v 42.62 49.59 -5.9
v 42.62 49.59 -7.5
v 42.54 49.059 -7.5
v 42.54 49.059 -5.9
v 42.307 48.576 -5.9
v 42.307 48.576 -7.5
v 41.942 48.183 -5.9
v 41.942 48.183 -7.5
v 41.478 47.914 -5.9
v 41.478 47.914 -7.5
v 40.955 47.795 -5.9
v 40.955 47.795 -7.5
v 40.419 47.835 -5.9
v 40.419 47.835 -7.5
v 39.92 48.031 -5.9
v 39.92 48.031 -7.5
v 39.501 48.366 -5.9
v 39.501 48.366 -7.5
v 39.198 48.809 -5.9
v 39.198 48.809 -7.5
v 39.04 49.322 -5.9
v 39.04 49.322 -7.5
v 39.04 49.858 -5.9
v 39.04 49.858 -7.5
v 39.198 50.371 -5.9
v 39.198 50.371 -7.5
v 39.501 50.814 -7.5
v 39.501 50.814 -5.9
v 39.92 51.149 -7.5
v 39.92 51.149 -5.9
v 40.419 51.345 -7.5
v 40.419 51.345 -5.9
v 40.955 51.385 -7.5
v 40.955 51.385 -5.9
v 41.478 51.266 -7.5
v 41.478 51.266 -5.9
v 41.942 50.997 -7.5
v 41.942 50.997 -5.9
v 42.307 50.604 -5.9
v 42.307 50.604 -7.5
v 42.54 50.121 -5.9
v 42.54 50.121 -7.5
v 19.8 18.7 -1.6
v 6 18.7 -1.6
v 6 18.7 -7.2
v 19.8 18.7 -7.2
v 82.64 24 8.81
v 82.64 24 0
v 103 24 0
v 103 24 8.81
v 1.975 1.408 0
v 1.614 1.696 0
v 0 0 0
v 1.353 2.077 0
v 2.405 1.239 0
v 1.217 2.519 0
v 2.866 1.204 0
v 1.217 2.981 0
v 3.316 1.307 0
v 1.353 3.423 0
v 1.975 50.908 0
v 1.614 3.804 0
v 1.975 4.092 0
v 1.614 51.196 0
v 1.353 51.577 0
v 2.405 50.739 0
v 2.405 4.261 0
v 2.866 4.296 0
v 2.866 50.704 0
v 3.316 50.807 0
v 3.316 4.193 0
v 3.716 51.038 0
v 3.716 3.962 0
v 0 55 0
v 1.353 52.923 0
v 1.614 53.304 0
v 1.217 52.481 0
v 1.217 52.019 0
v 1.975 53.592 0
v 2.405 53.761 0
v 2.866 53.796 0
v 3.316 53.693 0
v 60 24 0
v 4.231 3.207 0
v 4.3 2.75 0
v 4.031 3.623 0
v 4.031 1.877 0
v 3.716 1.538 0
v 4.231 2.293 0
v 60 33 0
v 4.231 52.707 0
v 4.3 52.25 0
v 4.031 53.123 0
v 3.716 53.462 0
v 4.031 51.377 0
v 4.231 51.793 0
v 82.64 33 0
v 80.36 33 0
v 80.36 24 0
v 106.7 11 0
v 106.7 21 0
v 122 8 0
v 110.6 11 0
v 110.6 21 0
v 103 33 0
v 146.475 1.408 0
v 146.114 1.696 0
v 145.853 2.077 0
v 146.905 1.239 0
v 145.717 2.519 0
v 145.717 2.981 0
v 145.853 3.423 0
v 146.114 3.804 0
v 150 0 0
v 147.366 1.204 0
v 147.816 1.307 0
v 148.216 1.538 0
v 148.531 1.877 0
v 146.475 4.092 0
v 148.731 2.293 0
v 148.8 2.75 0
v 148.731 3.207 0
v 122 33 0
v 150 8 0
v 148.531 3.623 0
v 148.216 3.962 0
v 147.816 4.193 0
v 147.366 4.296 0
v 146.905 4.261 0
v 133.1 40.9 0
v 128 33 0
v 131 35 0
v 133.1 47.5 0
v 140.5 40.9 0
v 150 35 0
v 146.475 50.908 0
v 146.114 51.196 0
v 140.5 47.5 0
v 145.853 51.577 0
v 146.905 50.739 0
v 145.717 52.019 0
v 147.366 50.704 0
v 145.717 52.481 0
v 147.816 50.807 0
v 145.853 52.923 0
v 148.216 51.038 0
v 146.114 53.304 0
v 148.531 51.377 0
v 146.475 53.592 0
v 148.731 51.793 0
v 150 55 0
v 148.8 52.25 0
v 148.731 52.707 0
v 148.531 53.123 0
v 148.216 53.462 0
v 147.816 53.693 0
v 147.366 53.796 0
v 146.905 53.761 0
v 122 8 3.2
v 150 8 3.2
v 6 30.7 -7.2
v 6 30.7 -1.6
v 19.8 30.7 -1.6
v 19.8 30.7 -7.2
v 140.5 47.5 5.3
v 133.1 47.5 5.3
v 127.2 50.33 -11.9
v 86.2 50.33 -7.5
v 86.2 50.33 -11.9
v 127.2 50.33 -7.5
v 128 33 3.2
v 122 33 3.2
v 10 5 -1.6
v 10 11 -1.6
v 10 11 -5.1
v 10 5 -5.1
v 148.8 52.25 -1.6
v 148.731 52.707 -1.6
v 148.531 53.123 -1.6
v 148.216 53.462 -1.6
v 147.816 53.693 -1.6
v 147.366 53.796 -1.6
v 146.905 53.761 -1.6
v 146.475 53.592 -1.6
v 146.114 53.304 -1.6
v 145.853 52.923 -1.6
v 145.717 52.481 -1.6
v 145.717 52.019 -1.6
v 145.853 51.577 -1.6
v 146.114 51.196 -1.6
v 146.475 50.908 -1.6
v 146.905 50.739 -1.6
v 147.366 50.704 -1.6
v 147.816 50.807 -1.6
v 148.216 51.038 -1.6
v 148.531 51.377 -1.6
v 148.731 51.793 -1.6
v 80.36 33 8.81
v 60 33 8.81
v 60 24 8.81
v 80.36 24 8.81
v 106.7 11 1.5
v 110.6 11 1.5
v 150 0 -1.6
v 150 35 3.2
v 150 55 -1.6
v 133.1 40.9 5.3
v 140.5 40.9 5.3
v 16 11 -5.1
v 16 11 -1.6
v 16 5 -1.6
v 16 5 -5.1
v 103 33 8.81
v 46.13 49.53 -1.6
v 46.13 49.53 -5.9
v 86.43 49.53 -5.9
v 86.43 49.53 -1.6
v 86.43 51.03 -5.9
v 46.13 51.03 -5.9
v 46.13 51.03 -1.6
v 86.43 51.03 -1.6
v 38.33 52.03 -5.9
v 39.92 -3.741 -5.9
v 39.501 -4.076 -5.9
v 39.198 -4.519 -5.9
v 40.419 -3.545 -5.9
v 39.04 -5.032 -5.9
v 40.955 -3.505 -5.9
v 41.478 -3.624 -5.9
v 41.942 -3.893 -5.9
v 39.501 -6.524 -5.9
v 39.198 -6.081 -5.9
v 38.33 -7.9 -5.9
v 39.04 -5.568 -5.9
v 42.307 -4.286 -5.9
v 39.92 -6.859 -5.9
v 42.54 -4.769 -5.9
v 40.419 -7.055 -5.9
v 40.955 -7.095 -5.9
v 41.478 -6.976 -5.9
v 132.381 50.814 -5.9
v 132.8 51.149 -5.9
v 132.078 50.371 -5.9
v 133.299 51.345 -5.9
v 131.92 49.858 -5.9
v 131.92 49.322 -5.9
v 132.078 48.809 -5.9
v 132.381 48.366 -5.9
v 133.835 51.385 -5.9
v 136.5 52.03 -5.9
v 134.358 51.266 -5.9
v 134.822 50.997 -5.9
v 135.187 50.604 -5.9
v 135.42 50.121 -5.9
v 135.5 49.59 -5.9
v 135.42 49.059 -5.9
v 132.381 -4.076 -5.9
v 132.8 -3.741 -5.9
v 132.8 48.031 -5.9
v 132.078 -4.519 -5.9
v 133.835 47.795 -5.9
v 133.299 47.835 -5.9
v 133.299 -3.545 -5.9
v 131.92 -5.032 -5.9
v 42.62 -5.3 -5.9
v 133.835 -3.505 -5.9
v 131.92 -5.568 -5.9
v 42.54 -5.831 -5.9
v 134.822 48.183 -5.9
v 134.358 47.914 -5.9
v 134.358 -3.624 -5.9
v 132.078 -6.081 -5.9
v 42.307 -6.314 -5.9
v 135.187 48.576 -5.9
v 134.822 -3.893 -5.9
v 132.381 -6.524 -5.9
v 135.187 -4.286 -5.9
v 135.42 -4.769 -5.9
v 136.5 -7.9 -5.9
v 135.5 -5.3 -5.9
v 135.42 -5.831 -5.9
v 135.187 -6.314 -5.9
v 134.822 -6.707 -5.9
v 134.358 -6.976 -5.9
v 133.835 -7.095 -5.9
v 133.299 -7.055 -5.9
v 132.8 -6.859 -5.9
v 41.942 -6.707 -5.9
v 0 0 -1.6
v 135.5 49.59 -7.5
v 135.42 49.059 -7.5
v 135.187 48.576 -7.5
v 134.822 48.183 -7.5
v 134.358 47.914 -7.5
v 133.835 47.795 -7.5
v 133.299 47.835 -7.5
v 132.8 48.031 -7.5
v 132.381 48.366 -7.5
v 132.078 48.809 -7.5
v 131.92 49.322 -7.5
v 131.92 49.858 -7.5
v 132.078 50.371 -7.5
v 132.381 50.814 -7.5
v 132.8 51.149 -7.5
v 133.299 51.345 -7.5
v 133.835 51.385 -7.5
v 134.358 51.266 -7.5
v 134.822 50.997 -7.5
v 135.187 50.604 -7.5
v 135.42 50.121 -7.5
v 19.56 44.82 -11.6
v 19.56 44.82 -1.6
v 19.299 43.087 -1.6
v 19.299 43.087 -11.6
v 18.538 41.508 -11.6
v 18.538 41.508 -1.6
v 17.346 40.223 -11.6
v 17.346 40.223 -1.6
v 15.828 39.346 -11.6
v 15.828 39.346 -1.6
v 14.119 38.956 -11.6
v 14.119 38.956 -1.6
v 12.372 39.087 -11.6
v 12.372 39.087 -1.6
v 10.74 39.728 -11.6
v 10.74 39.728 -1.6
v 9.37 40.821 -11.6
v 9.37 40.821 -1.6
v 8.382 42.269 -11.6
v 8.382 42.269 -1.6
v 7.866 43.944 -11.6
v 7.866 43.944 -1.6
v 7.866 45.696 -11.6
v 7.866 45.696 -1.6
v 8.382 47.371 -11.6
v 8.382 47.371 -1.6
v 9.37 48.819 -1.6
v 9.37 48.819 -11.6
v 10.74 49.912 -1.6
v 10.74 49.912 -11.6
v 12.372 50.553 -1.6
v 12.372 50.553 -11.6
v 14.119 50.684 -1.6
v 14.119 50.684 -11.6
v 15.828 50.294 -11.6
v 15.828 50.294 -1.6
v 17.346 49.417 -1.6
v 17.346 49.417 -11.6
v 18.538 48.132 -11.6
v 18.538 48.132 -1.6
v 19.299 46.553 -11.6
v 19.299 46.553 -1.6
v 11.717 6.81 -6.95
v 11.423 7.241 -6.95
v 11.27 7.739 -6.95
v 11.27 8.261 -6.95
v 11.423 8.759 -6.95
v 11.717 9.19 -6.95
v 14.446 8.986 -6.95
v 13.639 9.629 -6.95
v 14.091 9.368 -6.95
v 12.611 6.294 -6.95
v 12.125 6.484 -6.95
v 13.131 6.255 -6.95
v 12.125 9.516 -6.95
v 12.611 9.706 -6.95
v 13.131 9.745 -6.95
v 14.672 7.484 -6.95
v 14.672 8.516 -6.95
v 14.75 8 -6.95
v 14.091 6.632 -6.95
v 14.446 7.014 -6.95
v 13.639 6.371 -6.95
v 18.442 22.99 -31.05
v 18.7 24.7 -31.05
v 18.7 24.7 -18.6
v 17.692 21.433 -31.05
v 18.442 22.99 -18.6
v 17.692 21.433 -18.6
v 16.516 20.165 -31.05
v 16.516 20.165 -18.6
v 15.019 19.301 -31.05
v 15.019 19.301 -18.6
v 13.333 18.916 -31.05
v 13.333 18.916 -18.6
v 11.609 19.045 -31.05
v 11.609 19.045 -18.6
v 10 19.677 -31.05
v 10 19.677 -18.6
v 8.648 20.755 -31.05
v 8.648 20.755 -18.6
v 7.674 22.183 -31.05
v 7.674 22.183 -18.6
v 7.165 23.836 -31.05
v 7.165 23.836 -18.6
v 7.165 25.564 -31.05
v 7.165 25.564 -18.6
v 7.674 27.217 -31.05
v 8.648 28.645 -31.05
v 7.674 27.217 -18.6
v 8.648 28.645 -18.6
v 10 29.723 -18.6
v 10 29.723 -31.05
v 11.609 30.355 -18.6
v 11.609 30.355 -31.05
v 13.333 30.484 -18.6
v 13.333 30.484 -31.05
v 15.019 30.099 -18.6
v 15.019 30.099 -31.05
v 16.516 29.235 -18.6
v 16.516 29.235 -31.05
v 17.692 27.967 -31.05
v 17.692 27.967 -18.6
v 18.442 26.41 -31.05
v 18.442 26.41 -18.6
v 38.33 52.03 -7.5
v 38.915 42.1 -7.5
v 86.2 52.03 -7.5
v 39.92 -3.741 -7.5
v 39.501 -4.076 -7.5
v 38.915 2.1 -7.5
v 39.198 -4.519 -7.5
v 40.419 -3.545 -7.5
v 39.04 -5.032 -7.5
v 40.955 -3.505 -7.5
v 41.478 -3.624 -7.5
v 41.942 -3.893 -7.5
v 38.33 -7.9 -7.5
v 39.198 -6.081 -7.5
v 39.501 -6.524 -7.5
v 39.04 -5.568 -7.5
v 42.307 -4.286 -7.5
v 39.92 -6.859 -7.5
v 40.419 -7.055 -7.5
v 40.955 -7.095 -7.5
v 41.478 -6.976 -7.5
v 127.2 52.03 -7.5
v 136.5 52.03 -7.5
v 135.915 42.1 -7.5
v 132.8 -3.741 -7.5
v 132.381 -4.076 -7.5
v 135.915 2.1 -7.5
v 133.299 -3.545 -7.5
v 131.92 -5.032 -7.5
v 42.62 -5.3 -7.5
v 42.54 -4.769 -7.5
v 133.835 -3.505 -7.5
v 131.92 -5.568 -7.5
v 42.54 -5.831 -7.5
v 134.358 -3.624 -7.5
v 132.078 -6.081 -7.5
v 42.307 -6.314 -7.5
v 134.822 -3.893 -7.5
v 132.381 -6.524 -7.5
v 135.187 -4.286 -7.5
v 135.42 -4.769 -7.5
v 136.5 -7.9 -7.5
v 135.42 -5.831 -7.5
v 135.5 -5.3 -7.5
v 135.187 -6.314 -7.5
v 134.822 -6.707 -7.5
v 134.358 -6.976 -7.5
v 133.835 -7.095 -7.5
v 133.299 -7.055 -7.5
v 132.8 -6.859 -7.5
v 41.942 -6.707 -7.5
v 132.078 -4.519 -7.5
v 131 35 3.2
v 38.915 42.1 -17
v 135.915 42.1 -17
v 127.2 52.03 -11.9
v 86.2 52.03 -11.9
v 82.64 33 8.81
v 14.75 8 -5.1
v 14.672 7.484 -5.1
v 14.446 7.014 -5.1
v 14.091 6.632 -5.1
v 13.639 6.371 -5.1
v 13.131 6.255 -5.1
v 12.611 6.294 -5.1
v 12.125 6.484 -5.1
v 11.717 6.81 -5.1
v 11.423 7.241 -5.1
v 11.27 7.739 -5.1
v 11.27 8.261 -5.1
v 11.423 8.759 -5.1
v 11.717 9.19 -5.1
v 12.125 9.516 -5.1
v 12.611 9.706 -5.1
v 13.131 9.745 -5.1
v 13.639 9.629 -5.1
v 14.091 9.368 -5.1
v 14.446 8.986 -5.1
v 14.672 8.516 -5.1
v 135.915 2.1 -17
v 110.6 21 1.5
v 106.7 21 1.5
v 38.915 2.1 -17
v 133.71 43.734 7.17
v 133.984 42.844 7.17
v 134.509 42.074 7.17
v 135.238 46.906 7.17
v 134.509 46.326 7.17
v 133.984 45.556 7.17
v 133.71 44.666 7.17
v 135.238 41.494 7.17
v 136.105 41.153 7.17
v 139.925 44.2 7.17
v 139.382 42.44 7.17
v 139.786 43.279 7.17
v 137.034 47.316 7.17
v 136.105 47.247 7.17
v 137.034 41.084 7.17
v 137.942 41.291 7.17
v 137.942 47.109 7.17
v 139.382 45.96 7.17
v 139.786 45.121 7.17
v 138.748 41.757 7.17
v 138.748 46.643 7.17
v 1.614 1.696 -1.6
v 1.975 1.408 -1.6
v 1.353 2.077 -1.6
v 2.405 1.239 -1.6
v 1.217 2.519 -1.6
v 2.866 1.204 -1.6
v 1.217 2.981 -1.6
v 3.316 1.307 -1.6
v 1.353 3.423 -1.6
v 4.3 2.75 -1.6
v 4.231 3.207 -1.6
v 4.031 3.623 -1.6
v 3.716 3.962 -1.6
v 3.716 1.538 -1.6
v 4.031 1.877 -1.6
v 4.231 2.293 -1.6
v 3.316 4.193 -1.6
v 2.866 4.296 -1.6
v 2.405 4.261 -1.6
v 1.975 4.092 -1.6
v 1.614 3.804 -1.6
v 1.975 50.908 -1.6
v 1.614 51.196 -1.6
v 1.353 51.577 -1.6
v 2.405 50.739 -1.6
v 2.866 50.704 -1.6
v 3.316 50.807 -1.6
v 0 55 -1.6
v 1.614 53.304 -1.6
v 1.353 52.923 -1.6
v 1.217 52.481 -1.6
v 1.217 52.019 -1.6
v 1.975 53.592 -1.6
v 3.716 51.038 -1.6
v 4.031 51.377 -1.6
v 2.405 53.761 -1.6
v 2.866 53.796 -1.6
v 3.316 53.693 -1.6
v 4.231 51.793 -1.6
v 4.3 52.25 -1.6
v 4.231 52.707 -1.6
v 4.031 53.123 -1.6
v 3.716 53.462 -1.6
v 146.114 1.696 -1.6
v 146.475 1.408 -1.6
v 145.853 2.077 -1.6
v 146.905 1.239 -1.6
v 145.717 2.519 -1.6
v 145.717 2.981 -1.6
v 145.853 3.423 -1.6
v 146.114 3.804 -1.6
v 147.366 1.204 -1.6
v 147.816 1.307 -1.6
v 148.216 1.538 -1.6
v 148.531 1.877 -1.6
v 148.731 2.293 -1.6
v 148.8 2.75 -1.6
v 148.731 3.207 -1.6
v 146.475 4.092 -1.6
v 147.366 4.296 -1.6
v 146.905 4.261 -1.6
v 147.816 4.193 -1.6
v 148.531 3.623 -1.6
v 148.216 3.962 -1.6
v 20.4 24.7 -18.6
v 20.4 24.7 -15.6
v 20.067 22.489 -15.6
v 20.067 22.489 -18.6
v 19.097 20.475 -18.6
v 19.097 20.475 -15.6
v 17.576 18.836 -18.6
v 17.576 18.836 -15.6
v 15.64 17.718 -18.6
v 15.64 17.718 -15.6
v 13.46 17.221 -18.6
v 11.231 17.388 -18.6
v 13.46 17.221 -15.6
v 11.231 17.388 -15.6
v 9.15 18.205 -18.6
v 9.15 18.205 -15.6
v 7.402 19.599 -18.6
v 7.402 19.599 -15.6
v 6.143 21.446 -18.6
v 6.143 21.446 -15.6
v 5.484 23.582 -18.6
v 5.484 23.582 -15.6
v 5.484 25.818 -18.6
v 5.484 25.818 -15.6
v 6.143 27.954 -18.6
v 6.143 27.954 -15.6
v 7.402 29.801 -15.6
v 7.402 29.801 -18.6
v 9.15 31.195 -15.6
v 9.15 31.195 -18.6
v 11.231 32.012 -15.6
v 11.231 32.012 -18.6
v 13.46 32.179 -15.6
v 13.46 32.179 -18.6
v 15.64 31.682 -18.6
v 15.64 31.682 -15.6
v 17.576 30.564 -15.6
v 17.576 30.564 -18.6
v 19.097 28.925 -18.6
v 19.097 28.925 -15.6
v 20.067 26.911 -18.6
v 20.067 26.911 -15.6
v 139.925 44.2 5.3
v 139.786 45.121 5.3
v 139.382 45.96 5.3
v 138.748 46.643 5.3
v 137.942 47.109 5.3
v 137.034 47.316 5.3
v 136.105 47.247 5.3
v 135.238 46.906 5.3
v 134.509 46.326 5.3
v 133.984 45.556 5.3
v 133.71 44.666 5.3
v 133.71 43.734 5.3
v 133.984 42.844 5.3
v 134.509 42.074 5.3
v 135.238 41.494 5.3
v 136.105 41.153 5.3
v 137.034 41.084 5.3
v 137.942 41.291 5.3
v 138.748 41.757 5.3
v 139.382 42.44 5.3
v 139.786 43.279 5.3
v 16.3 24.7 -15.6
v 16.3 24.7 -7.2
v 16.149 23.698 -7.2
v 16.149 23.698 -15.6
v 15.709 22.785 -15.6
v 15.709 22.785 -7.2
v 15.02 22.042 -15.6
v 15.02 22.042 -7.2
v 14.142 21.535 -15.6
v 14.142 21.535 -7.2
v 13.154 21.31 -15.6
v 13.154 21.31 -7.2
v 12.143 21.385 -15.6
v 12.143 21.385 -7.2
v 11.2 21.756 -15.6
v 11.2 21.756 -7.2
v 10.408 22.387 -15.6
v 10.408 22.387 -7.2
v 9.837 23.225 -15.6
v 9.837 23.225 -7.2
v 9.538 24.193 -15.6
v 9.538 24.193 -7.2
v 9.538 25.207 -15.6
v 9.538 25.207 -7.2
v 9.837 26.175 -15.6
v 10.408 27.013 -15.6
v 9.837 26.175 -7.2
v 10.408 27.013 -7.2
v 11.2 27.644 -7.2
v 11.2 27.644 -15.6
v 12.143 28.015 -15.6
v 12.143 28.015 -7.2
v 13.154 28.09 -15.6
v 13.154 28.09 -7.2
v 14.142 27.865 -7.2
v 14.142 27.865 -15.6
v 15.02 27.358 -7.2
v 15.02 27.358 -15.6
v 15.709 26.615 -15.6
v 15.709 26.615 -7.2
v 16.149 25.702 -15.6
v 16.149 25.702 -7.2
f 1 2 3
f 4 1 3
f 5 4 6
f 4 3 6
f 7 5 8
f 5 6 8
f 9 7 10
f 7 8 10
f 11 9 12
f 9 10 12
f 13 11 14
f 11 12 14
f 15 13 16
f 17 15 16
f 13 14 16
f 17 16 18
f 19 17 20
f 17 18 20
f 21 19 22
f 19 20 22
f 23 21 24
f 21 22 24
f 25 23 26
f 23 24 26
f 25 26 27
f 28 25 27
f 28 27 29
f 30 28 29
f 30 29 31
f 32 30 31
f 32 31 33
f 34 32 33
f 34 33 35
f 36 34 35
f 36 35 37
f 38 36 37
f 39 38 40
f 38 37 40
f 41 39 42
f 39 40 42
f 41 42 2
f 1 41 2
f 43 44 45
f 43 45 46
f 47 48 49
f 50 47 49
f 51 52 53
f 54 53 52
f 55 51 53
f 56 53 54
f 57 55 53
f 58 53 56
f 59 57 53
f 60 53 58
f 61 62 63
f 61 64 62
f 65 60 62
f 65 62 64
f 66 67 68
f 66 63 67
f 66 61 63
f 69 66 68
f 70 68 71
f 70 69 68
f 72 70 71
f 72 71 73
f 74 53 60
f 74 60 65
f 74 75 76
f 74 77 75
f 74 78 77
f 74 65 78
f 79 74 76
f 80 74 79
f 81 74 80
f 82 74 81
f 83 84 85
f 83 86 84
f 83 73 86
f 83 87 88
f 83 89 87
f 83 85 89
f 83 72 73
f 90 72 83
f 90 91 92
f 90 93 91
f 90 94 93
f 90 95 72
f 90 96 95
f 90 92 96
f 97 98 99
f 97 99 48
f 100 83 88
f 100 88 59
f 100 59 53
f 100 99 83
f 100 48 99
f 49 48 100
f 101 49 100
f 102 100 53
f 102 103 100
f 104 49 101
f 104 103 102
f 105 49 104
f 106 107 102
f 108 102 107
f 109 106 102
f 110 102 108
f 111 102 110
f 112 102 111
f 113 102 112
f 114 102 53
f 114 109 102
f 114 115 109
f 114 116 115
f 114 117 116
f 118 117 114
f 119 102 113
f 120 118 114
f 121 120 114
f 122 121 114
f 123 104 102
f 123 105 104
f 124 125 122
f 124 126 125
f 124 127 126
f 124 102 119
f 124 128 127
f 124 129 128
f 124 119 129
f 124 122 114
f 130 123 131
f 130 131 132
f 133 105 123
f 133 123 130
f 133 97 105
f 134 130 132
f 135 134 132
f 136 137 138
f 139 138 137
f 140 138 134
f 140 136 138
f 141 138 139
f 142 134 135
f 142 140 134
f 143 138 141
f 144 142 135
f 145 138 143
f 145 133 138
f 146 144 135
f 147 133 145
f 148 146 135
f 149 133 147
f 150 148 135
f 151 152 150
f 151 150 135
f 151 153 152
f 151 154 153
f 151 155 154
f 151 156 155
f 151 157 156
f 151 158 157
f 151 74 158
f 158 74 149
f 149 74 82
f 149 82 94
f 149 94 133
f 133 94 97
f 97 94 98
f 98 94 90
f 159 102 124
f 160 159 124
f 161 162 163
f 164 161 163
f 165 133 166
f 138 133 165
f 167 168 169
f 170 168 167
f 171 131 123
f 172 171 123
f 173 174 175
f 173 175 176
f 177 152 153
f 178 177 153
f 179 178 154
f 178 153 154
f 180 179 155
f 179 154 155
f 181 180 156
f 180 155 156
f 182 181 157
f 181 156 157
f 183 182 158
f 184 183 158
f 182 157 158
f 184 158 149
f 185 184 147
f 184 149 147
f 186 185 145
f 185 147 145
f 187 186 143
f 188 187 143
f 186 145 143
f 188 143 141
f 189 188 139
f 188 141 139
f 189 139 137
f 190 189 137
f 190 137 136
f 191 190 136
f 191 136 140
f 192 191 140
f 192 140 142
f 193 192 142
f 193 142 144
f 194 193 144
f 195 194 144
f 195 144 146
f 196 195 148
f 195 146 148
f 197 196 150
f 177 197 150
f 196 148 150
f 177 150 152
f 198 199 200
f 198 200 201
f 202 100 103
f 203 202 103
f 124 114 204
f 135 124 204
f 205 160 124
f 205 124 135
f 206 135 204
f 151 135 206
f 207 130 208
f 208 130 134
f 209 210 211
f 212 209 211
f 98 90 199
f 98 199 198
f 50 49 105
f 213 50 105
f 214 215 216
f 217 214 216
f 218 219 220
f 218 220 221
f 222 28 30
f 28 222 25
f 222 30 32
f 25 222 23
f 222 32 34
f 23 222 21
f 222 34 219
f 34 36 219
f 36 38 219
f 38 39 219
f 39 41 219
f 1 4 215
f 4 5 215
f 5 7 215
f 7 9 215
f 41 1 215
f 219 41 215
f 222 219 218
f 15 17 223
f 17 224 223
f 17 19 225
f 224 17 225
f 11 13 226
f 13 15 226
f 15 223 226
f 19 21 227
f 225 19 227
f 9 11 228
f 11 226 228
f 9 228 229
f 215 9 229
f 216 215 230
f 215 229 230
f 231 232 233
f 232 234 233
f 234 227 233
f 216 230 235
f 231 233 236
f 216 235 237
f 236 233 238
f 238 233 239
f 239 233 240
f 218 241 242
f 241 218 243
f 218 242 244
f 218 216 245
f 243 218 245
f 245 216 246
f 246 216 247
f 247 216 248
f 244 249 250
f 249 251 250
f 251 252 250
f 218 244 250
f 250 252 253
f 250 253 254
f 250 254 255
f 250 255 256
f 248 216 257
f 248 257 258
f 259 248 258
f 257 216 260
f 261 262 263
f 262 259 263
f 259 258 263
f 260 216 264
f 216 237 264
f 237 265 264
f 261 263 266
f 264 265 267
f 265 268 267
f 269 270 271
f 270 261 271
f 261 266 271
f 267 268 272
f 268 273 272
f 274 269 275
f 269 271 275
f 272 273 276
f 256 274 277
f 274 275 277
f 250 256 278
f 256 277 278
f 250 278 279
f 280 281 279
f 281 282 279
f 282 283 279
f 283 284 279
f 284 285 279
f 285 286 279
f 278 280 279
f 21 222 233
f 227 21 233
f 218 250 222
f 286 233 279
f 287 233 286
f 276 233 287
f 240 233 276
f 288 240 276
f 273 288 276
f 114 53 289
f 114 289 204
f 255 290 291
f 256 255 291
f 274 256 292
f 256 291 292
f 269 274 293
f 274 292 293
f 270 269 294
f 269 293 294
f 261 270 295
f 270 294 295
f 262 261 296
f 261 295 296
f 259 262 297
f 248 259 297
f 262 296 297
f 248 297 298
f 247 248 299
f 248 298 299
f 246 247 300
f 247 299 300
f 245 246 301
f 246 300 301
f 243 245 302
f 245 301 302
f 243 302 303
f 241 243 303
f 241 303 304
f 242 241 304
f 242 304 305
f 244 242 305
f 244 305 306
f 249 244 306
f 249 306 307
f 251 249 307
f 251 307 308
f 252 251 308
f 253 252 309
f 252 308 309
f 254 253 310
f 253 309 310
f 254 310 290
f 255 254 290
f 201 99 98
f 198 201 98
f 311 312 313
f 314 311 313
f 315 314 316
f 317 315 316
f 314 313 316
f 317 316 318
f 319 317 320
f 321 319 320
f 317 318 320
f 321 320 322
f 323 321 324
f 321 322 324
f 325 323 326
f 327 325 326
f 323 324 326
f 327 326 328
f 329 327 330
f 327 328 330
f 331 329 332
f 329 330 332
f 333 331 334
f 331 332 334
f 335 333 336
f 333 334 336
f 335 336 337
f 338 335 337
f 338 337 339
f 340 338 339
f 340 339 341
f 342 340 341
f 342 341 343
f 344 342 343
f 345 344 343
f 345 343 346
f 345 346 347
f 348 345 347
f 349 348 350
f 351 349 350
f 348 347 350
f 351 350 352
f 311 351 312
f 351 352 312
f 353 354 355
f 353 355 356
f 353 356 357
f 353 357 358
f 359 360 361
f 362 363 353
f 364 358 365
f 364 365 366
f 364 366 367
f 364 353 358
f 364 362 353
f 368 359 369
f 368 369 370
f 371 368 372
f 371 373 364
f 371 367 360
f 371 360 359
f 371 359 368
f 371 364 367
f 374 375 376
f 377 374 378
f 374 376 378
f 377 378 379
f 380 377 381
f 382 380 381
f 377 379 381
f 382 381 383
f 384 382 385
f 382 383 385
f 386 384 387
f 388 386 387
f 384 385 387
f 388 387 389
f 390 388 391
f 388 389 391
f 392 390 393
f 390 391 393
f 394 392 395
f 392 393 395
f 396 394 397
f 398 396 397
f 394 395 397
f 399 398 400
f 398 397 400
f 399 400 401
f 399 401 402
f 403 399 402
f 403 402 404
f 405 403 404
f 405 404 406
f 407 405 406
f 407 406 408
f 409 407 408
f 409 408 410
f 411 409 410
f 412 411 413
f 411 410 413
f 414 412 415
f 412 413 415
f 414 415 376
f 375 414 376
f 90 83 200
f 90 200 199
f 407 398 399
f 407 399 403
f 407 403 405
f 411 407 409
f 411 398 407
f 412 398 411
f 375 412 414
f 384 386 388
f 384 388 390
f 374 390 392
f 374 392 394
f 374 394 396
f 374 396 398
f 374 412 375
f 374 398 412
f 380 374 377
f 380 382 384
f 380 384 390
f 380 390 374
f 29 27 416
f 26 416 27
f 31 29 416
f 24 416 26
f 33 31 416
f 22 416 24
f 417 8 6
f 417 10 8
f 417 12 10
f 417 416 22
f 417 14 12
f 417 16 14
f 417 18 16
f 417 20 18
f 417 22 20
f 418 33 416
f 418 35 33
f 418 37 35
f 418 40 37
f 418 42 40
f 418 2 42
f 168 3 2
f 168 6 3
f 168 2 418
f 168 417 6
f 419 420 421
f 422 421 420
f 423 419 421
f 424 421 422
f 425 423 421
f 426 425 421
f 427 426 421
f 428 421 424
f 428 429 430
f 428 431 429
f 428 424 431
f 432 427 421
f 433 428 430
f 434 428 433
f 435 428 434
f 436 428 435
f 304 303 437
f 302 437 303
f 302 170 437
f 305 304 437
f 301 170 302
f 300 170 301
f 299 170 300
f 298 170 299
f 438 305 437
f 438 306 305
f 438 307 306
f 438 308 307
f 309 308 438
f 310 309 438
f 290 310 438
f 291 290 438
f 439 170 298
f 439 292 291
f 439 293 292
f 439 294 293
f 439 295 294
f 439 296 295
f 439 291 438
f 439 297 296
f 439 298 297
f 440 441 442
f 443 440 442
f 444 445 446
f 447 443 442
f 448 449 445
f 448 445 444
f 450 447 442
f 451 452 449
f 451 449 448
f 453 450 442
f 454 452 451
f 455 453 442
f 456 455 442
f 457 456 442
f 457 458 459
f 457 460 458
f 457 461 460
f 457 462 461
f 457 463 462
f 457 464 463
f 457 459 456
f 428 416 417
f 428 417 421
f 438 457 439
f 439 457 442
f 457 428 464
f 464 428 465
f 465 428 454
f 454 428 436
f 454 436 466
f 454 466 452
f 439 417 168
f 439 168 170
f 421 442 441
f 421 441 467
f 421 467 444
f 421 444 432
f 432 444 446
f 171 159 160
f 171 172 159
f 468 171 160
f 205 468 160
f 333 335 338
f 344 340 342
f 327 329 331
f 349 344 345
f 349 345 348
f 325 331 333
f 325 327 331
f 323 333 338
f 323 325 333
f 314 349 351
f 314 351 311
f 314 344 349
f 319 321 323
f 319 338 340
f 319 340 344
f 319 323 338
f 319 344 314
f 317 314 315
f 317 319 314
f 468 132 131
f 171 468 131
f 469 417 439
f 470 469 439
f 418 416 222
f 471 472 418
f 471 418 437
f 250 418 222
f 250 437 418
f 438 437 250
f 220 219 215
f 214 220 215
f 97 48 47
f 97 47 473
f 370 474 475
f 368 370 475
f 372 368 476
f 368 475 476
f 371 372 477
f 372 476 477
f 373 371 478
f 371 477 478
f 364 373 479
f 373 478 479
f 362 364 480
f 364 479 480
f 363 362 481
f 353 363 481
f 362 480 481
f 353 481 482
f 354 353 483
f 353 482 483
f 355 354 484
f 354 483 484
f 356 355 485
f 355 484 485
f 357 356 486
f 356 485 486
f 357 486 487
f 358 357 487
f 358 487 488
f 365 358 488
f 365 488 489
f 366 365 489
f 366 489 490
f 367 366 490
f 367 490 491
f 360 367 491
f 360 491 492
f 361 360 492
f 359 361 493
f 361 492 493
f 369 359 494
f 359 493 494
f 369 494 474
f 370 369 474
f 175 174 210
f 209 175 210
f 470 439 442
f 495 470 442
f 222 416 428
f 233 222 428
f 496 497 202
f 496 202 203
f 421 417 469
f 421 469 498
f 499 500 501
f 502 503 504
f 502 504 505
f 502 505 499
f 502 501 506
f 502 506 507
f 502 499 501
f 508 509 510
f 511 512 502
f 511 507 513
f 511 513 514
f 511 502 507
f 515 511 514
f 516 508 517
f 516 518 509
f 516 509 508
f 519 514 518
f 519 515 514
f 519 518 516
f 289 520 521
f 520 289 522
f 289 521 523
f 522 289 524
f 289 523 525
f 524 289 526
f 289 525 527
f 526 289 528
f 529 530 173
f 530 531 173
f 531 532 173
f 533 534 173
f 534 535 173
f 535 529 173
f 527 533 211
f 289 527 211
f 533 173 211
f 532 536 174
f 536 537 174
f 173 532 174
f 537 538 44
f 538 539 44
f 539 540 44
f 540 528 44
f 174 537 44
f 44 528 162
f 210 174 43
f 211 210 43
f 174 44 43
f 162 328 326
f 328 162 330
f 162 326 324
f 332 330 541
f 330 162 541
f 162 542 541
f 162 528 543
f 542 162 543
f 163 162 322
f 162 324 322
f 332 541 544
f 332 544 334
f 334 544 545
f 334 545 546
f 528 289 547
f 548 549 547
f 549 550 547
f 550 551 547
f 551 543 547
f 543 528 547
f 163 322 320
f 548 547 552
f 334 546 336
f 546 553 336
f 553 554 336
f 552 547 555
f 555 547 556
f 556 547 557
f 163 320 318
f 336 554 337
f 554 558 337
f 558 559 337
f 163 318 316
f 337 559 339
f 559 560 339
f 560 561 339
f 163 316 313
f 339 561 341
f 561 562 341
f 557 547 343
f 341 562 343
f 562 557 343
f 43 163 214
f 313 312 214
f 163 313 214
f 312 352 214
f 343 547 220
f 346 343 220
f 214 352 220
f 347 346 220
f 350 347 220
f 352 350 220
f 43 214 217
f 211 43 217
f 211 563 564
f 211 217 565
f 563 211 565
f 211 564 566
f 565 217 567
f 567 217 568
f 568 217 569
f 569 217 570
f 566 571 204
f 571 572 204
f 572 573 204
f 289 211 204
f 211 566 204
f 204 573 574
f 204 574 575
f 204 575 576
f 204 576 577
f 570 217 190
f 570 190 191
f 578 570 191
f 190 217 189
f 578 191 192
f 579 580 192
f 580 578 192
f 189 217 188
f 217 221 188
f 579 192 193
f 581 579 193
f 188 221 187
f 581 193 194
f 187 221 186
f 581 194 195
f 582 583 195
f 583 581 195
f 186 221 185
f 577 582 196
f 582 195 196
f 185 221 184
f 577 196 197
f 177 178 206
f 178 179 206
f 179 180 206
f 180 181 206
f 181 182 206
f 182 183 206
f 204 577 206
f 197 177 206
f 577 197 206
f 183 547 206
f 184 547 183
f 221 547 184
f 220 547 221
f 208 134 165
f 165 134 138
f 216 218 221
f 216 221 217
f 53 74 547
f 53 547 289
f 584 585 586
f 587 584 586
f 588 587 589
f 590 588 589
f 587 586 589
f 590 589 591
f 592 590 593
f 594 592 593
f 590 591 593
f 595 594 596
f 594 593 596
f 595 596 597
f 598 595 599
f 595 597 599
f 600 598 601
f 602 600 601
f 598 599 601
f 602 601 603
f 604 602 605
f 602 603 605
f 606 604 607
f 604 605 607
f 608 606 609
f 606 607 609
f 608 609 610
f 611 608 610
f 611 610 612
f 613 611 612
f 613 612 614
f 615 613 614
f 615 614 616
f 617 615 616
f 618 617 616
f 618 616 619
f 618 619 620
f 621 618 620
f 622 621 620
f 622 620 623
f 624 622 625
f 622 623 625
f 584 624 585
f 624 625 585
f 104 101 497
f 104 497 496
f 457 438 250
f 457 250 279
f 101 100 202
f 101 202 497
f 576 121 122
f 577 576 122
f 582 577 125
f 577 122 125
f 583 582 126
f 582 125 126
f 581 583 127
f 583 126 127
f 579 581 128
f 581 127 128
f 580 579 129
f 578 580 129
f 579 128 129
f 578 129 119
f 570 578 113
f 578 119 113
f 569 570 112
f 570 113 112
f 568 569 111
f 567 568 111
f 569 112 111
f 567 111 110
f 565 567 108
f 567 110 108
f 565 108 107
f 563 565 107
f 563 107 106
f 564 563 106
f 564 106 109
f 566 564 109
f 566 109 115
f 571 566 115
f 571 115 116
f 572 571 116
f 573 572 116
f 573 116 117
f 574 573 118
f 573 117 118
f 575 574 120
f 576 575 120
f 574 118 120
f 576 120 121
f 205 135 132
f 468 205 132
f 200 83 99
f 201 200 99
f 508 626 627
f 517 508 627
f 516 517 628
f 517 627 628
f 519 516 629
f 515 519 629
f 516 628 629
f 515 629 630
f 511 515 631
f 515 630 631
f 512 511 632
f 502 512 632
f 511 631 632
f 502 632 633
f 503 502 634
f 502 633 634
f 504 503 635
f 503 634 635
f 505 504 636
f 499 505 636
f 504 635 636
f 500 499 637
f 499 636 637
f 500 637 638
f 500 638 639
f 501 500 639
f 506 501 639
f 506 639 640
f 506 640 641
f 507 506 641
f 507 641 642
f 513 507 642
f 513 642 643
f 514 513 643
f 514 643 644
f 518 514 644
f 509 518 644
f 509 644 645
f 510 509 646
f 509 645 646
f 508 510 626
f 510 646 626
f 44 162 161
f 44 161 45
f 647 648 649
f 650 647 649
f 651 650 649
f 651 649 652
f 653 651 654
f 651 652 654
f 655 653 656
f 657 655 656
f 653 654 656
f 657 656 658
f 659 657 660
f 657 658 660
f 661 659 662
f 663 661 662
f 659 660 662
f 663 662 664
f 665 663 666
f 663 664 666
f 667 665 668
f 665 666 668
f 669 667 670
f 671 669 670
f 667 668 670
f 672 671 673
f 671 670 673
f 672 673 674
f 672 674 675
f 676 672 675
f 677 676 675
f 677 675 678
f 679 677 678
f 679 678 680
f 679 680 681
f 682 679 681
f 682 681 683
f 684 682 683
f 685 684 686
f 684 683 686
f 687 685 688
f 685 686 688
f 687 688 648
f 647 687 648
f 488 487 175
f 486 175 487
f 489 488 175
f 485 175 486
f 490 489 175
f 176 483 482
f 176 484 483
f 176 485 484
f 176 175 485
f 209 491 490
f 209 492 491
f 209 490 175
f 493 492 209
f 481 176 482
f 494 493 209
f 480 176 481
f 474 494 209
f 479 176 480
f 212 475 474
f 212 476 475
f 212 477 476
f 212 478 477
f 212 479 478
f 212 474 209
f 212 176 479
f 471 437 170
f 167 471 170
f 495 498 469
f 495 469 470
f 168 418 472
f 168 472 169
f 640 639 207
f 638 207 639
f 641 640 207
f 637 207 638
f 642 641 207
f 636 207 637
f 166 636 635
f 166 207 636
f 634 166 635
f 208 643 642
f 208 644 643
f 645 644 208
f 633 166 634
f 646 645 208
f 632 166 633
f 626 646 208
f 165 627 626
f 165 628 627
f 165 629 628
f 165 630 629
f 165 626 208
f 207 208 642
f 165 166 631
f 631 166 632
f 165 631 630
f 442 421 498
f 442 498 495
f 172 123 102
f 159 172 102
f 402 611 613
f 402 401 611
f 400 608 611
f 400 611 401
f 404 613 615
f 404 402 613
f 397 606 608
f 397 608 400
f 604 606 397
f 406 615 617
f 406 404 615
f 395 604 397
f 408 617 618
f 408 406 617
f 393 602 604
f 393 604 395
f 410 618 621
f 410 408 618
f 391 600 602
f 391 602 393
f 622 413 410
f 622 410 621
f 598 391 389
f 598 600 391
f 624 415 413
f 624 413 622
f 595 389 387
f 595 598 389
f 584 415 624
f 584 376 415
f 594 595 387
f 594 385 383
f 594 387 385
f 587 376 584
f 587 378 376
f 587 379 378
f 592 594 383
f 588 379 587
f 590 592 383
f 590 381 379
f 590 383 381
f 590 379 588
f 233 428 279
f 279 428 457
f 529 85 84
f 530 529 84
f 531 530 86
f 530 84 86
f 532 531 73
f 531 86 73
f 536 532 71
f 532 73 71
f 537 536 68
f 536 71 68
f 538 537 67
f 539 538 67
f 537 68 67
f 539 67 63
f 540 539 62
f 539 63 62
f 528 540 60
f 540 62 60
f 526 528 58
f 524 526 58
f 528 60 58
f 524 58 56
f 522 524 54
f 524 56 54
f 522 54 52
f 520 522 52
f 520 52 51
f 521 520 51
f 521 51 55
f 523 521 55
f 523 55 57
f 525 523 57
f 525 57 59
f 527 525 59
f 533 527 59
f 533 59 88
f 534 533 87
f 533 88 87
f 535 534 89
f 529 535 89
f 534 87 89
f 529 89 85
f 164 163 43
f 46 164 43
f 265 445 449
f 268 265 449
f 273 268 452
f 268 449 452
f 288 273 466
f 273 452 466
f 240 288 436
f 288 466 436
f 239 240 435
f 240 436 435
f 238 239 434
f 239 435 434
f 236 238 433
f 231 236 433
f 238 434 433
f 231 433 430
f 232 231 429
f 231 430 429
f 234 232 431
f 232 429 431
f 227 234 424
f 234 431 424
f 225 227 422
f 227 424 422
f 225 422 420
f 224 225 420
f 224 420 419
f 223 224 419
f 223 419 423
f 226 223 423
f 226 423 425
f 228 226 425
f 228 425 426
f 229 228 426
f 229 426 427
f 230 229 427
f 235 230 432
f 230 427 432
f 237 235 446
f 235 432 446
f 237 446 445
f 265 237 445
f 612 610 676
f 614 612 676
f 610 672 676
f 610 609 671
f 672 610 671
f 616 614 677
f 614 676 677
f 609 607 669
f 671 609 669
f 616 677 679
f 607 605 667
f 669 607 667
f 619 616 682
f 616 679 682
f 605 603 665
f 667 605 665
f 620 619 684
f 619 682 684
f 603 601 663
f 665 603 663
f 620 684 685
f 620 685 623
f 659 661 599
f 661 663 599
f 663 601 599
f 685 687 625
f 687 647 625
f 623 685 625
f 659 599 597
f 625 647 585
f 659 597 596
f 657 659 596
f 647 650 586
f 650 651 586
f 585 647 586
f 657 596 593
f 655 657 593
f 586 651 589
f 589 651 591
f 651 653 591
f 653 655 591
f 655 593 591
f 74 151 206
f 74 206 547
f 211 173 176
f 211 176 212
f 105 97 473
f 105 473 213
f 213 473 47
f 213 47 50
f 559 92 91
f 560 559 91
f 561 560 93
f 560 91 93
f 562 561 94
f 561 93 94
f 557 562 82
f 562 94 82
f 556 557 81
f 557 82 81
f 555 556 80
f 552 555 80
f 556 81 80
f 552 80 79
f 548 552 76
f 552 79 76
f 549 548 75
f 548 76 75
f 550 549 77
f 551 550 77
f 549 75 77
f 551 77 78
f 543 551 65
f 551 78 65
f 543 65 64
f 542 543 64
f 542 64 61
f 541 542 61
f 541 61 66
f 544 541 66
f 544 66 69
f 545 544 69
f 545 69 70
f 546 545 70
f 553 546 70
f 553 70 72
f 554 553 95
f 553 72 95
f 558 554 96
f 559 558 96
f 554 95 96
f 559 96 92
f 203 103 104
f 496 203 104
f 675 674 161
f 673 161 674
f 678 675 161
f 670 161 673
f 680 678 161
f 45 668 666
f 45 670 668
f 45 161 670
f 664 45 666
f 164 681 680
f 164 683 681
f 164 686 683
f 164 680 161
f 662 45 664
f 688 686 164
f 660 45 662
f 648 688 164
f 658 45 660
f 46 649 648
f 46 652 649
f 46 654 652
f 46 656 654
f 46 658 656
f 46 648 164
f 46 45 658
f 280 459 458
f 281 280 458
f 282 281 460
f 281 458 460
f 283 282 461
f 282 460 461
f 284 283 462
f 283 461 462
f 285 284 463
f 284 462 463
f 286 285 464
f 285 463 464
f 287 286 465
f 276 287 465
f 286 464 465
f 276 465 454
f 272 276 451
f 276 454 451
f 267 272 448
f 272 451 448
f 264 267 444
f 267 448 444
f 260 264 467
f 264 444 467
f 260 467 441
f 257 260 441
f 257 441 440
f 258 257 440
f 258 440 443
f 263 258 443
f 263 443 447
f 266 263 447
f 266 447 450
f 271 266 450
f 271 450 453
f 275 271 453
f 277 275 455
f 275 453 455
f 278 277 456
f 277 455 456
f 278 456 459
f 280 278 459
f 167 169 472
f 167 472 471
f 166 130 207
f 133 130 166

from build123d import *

# Parameters (mm, degrees)
F0_R      = 1.55
F0_W      = 3.9
F0_H      = 10
F0_W_2    = 20.36
F0_H_2    = 9
F0_W_3    = 7.4
F0_H_3    = 6.6
F0_R_2    = 3.125
F1_DEPTH  = 1.6
F2_DEPTH  = 8.81
F3_DEPTH  = 3.2
F4_DEPTH  = 1.5
F5_DEPTH  = 5.3
F6_R      = 3.125
F7_DEPTH  = 1.87
F8_R      = 5.88
F9_DEPTH  = 10
F10_W     = 13.8
F10_H     = 12
F11_DEPTH = 5.6
F12_R     = 3.4
F13_DEPTH = 8.4
F14_R     = 7.5
F14_R_2   = 3.4
F15_DEPTH = 3
F16_R     = 5.8
F17_DEPTH = 12.45
F10_W_2   = 6
F10_H_2   = 6
F10_R     = 1.75
F18_DEPTH = 3.5
F19_R     = 1.75
F20_DEPTH = 1.85
F22_W     = 40.3
F22_H     = 1.5
F23_DEPTH = 5.9
F22_W_2   = 98.17
F22_H_2   = 59.93
F22_R     = 1.8
F24_DEPTH = 1.6
F25_W     = 41
F25_H     = 1.7
F26_DEPTH = 4.4
F25_W_2   = 97
F25_H_2   = 40
F27_DEPTH = 9.5


with BuildPart() as f1:
    # F0 (on Top) → F1 (new body)
    with BuildSketch(Plane.XY):
        Polygon((0, 55), (0, 0), (150, 0), (150, 8), (122, 8), (122, 33), (128, 33), (131, 35), (150, 35), (150, 55), align=None)
        with Locations((2.75, 2.75)):
            Circle(F0_R, mode=Mode.SUBTRACT)
        with Locations((147.25, 2.75)):
            Circle(F0_R, mode=Mode.SUBTRACT)
        with Locations((108.65, 16)):
            Rectangle(F0_W, F0_H, mode=Mode.SUBTRACT)
        with Locations((70.18, 28.5)):
            Rectangle(F0_W_2, F0_H_2, mode=Mode.SUBTRACT)
        with Locations((2.75, 52.25)):
            Circle(F0_R, mode=Mode.SUBTRACT)
        with Locations((92.82, 28.5)):
            Rectangle(F0_W_2, F0_H_2, mode=Mode.SUBTRACT)
        with Locations((136.8, 44.2)):
            Rectangle(F0_W_3, F0_H_3, mode=Mode.SUBTRACT)
        with Locations((147.25, 52.25)):
            Circle(F0_R, mode=Mode.SUBTRACT)
        Polygon((122, 8), (150, 8), (150, 35), (131, 35), (128, 33), (122, 33), align=None)
        with Locations((70.18, 28.5)):
            Rectangle(F0_W_2, F0_H_2)
        with Locations((108.65, 16)):
            Rectangle(F0_W, F0_H)
        with Locations((136.8, 44.2)):
            Rectangle(F0_W_3, F0_H_3)
        with Locations((136.8, 44.2)):
            Circle(F0_R_2, mode=Mode.SUBTRACT)
        with Locations((136.8, 44.2)):
            Circle(F0_R_2)
        with Locations((92.82, 28.5)):
            Rectangle(F0_W_2, F0_H_2)
    extrude(amount=-F1_DEPTH)

    # F0 (on Top) → F2 (join)
    with BuildSketch(Plane.XY):
        with Locations((70.18, 28.5)):
            Rectangle(F0_W_2, F0_H_2)
        with Locations((92.82, 28.5)):
            Rectangle(F0_W_2, F0_H_2)
    extrude(amount=F2_DEPTH)

    # F0 (on Top) → F3 (join)
    with BuildSketch(Plane.XY):
        Polygon((122, 8), (150, 8), (150, 35), (131, 35), (128, 33), (122, 33), align=None)
    extrude(amount=F3_DEPTH)

    # F0 (on Top) → F4 (join)
    with BuildSketch(Plane.XY):
        with Locations((108.65, 16)):
            Rectangle(F0_W, F0_H)
    extrude(amount=F4_DEPTH)

    # F0 (on Top) → F5 (join)
    with BuildSketch(Plane.XY):
        with Locations((136.8, 44.2)):
            Rectangle(F0_W_3, F0_H_3)
        with Locations((136.8, 44.2)):
            Circle(F0_R_2, mode=Mode.SUBTRACT)
        with Locations((136.8, 44.2)):
            Circle(F0_R_2)
    extrude(amount=F5_DEPTH)

    # F6 (on face) → F7 (join)
    with BuildSketch(Plane.XY.offset(5.3)):
        with Locations((136.8, 44.2)):
            Circle(F6_R)
    extrude(amount=F7_DEPTH)

    # F8 (on face) → F9 (join)
    with BuildSketch(Plane(origin=(0, 0, -1.6), x_dir=(1, 0, 0), z_dir=(0, 0, -1))):
        with Locations((13.68, -44.82)):
            Circle(F8_R)
    extrude(amount=F9_DEPTH)

    # F10 (on face) → F11 (join)
    with BuildSketch(Plane(origin=(0, 0, -1.6), x_dir=(1, 0, 0), z_dir=(0, 0, -1))):
        with Locations((12.9, -24.7)):
            Rectangle(F10_W, F10_H)
    extrude(amount=F11_DEPTH)

    # F12 (on face) → F13 (join)
    with BuildSketch(Plane(origin=(0, 0, -7.2), x_dir=(1, 0, 0), z_dir=(0, 0, -1))):
        with Locations((12.9, -24.7)):
            Circle(F12_R)
    extrude(amount=F13_DEPTH)

    # F14 (on face) → F15 (join)
    with BuildSketch(Plane(origin=(0, 0, -15.6), x_dir=(1, 0, 0), z_dir=(0, 0, -1))):
        with Locations((12.9, -24.7)):
            Circle(F14_R)
        with Locations((12.9, -24.7)):
            Circle(F14_R_2, mode=Mode.SUBTRACT)
        with Locations((12.9, -24.7)):
            Circle(F14_R_2)
    extrude(amount=F15_DEPTH)

    # F16 (on face) → F17 (join)
    with BuildSketch(Plane(origin=(0, 0, -18.6), x_dir=(1, 0, 0), z_dir=(0, 0, -1))):
        with Locations((12.9, -24.7)):
            Circle(F16_R)
    extrude(amount=F17_DEPTH)

    # F10 (on face) → F18 (join)
    with BuildSketch(Plane(origin=(0, 0, -1.6), x_dir=(1, 0, 0), z_dir=(0, 0, -1))):
        with Locations((13, -8)):
            Rectangle(F10_W_2, F10_H_2)
        with Locations((13, -8)):
            Circle(F10_R, mode=Mode.SUBTRACT)
        with Locations((13, -8)):
            Circle(F10_R)
    extrude(amount=F18_DEPTH)

    # F19 (on face) → F20 (join)
    with BuildSketch(Plane(origin=(0, 0, -5.1), x_dir=(1, 0, 0), z_dir=(0, 0, -1))):
        with Locations((13, -8)):
            Circle(F19_R)
    extrude(amount=F20_DEPTH)

    # F22 (on offset) → F23 (join, through all)
    with BuildSketch(Plane(origin=(0, 0, -7.5), x_dir=(1, 0, 0), z_dir=(0, 0, -1))):
        with Locations((66.28, -50.28)):
            Rectangle(F22_W, F22_H)
    extrude(amount=-F23_DEPTH)

    # F22 (on offset) → F24 (join)
    with BuildSketch(Plane(origin=(0, 0, -7.5), x_dir=(1, 0, 0), z_dir=(0, 0, -1))):
        with Locations((87.415, -22.065)):
            Rectangle(F22_W_2, F22_H_2)
        with Locations((40.82, -49.59)):
            Circle(F22_R, mode=Mode.SUBTRACT)
        with Locations((66.28, -50.28)):
            Rectangle(F22_W, F22_H, mode=Mode.SUBTRACT)
        with Locations((133.7, -49.59)):
            Circle(F22_R, mode=Mode.SUBTRACT)
        with Locations((40.82, 5.3)):
            Circle(F22_R, mode=Mode.SUBTRACT)
        with Locations((133.7, 5.3)):
            Circle(F22_R, mode=Mode.SUBTRACT)
    extrude(amount=-F24_DEPTH)

    # F25 (on face) → F26 (join)
    with BuildSketch(Plane(origin=(0, 0, -7.5), x_dir=(1, 0, 0), z_dir=(0, 0, -1))):
        with Locations((106.7, -51.18)):
            Rectangle(F25_W, F25_H)
    extrude(amount=F26_DEPTH)

    # F25 (on face) → F27 (join)
    with BuildSketch(Plane(origin=(0, 0, -7.5), x_dir=(1, 0, 0), z_dir=(0, 0, -1))):
        with Locations((87.415, -22.1)):
            Rectangle(F25_W_2, F25_H_2)
    extrude(amount=F27_DEPTH)


solid = f1.part
